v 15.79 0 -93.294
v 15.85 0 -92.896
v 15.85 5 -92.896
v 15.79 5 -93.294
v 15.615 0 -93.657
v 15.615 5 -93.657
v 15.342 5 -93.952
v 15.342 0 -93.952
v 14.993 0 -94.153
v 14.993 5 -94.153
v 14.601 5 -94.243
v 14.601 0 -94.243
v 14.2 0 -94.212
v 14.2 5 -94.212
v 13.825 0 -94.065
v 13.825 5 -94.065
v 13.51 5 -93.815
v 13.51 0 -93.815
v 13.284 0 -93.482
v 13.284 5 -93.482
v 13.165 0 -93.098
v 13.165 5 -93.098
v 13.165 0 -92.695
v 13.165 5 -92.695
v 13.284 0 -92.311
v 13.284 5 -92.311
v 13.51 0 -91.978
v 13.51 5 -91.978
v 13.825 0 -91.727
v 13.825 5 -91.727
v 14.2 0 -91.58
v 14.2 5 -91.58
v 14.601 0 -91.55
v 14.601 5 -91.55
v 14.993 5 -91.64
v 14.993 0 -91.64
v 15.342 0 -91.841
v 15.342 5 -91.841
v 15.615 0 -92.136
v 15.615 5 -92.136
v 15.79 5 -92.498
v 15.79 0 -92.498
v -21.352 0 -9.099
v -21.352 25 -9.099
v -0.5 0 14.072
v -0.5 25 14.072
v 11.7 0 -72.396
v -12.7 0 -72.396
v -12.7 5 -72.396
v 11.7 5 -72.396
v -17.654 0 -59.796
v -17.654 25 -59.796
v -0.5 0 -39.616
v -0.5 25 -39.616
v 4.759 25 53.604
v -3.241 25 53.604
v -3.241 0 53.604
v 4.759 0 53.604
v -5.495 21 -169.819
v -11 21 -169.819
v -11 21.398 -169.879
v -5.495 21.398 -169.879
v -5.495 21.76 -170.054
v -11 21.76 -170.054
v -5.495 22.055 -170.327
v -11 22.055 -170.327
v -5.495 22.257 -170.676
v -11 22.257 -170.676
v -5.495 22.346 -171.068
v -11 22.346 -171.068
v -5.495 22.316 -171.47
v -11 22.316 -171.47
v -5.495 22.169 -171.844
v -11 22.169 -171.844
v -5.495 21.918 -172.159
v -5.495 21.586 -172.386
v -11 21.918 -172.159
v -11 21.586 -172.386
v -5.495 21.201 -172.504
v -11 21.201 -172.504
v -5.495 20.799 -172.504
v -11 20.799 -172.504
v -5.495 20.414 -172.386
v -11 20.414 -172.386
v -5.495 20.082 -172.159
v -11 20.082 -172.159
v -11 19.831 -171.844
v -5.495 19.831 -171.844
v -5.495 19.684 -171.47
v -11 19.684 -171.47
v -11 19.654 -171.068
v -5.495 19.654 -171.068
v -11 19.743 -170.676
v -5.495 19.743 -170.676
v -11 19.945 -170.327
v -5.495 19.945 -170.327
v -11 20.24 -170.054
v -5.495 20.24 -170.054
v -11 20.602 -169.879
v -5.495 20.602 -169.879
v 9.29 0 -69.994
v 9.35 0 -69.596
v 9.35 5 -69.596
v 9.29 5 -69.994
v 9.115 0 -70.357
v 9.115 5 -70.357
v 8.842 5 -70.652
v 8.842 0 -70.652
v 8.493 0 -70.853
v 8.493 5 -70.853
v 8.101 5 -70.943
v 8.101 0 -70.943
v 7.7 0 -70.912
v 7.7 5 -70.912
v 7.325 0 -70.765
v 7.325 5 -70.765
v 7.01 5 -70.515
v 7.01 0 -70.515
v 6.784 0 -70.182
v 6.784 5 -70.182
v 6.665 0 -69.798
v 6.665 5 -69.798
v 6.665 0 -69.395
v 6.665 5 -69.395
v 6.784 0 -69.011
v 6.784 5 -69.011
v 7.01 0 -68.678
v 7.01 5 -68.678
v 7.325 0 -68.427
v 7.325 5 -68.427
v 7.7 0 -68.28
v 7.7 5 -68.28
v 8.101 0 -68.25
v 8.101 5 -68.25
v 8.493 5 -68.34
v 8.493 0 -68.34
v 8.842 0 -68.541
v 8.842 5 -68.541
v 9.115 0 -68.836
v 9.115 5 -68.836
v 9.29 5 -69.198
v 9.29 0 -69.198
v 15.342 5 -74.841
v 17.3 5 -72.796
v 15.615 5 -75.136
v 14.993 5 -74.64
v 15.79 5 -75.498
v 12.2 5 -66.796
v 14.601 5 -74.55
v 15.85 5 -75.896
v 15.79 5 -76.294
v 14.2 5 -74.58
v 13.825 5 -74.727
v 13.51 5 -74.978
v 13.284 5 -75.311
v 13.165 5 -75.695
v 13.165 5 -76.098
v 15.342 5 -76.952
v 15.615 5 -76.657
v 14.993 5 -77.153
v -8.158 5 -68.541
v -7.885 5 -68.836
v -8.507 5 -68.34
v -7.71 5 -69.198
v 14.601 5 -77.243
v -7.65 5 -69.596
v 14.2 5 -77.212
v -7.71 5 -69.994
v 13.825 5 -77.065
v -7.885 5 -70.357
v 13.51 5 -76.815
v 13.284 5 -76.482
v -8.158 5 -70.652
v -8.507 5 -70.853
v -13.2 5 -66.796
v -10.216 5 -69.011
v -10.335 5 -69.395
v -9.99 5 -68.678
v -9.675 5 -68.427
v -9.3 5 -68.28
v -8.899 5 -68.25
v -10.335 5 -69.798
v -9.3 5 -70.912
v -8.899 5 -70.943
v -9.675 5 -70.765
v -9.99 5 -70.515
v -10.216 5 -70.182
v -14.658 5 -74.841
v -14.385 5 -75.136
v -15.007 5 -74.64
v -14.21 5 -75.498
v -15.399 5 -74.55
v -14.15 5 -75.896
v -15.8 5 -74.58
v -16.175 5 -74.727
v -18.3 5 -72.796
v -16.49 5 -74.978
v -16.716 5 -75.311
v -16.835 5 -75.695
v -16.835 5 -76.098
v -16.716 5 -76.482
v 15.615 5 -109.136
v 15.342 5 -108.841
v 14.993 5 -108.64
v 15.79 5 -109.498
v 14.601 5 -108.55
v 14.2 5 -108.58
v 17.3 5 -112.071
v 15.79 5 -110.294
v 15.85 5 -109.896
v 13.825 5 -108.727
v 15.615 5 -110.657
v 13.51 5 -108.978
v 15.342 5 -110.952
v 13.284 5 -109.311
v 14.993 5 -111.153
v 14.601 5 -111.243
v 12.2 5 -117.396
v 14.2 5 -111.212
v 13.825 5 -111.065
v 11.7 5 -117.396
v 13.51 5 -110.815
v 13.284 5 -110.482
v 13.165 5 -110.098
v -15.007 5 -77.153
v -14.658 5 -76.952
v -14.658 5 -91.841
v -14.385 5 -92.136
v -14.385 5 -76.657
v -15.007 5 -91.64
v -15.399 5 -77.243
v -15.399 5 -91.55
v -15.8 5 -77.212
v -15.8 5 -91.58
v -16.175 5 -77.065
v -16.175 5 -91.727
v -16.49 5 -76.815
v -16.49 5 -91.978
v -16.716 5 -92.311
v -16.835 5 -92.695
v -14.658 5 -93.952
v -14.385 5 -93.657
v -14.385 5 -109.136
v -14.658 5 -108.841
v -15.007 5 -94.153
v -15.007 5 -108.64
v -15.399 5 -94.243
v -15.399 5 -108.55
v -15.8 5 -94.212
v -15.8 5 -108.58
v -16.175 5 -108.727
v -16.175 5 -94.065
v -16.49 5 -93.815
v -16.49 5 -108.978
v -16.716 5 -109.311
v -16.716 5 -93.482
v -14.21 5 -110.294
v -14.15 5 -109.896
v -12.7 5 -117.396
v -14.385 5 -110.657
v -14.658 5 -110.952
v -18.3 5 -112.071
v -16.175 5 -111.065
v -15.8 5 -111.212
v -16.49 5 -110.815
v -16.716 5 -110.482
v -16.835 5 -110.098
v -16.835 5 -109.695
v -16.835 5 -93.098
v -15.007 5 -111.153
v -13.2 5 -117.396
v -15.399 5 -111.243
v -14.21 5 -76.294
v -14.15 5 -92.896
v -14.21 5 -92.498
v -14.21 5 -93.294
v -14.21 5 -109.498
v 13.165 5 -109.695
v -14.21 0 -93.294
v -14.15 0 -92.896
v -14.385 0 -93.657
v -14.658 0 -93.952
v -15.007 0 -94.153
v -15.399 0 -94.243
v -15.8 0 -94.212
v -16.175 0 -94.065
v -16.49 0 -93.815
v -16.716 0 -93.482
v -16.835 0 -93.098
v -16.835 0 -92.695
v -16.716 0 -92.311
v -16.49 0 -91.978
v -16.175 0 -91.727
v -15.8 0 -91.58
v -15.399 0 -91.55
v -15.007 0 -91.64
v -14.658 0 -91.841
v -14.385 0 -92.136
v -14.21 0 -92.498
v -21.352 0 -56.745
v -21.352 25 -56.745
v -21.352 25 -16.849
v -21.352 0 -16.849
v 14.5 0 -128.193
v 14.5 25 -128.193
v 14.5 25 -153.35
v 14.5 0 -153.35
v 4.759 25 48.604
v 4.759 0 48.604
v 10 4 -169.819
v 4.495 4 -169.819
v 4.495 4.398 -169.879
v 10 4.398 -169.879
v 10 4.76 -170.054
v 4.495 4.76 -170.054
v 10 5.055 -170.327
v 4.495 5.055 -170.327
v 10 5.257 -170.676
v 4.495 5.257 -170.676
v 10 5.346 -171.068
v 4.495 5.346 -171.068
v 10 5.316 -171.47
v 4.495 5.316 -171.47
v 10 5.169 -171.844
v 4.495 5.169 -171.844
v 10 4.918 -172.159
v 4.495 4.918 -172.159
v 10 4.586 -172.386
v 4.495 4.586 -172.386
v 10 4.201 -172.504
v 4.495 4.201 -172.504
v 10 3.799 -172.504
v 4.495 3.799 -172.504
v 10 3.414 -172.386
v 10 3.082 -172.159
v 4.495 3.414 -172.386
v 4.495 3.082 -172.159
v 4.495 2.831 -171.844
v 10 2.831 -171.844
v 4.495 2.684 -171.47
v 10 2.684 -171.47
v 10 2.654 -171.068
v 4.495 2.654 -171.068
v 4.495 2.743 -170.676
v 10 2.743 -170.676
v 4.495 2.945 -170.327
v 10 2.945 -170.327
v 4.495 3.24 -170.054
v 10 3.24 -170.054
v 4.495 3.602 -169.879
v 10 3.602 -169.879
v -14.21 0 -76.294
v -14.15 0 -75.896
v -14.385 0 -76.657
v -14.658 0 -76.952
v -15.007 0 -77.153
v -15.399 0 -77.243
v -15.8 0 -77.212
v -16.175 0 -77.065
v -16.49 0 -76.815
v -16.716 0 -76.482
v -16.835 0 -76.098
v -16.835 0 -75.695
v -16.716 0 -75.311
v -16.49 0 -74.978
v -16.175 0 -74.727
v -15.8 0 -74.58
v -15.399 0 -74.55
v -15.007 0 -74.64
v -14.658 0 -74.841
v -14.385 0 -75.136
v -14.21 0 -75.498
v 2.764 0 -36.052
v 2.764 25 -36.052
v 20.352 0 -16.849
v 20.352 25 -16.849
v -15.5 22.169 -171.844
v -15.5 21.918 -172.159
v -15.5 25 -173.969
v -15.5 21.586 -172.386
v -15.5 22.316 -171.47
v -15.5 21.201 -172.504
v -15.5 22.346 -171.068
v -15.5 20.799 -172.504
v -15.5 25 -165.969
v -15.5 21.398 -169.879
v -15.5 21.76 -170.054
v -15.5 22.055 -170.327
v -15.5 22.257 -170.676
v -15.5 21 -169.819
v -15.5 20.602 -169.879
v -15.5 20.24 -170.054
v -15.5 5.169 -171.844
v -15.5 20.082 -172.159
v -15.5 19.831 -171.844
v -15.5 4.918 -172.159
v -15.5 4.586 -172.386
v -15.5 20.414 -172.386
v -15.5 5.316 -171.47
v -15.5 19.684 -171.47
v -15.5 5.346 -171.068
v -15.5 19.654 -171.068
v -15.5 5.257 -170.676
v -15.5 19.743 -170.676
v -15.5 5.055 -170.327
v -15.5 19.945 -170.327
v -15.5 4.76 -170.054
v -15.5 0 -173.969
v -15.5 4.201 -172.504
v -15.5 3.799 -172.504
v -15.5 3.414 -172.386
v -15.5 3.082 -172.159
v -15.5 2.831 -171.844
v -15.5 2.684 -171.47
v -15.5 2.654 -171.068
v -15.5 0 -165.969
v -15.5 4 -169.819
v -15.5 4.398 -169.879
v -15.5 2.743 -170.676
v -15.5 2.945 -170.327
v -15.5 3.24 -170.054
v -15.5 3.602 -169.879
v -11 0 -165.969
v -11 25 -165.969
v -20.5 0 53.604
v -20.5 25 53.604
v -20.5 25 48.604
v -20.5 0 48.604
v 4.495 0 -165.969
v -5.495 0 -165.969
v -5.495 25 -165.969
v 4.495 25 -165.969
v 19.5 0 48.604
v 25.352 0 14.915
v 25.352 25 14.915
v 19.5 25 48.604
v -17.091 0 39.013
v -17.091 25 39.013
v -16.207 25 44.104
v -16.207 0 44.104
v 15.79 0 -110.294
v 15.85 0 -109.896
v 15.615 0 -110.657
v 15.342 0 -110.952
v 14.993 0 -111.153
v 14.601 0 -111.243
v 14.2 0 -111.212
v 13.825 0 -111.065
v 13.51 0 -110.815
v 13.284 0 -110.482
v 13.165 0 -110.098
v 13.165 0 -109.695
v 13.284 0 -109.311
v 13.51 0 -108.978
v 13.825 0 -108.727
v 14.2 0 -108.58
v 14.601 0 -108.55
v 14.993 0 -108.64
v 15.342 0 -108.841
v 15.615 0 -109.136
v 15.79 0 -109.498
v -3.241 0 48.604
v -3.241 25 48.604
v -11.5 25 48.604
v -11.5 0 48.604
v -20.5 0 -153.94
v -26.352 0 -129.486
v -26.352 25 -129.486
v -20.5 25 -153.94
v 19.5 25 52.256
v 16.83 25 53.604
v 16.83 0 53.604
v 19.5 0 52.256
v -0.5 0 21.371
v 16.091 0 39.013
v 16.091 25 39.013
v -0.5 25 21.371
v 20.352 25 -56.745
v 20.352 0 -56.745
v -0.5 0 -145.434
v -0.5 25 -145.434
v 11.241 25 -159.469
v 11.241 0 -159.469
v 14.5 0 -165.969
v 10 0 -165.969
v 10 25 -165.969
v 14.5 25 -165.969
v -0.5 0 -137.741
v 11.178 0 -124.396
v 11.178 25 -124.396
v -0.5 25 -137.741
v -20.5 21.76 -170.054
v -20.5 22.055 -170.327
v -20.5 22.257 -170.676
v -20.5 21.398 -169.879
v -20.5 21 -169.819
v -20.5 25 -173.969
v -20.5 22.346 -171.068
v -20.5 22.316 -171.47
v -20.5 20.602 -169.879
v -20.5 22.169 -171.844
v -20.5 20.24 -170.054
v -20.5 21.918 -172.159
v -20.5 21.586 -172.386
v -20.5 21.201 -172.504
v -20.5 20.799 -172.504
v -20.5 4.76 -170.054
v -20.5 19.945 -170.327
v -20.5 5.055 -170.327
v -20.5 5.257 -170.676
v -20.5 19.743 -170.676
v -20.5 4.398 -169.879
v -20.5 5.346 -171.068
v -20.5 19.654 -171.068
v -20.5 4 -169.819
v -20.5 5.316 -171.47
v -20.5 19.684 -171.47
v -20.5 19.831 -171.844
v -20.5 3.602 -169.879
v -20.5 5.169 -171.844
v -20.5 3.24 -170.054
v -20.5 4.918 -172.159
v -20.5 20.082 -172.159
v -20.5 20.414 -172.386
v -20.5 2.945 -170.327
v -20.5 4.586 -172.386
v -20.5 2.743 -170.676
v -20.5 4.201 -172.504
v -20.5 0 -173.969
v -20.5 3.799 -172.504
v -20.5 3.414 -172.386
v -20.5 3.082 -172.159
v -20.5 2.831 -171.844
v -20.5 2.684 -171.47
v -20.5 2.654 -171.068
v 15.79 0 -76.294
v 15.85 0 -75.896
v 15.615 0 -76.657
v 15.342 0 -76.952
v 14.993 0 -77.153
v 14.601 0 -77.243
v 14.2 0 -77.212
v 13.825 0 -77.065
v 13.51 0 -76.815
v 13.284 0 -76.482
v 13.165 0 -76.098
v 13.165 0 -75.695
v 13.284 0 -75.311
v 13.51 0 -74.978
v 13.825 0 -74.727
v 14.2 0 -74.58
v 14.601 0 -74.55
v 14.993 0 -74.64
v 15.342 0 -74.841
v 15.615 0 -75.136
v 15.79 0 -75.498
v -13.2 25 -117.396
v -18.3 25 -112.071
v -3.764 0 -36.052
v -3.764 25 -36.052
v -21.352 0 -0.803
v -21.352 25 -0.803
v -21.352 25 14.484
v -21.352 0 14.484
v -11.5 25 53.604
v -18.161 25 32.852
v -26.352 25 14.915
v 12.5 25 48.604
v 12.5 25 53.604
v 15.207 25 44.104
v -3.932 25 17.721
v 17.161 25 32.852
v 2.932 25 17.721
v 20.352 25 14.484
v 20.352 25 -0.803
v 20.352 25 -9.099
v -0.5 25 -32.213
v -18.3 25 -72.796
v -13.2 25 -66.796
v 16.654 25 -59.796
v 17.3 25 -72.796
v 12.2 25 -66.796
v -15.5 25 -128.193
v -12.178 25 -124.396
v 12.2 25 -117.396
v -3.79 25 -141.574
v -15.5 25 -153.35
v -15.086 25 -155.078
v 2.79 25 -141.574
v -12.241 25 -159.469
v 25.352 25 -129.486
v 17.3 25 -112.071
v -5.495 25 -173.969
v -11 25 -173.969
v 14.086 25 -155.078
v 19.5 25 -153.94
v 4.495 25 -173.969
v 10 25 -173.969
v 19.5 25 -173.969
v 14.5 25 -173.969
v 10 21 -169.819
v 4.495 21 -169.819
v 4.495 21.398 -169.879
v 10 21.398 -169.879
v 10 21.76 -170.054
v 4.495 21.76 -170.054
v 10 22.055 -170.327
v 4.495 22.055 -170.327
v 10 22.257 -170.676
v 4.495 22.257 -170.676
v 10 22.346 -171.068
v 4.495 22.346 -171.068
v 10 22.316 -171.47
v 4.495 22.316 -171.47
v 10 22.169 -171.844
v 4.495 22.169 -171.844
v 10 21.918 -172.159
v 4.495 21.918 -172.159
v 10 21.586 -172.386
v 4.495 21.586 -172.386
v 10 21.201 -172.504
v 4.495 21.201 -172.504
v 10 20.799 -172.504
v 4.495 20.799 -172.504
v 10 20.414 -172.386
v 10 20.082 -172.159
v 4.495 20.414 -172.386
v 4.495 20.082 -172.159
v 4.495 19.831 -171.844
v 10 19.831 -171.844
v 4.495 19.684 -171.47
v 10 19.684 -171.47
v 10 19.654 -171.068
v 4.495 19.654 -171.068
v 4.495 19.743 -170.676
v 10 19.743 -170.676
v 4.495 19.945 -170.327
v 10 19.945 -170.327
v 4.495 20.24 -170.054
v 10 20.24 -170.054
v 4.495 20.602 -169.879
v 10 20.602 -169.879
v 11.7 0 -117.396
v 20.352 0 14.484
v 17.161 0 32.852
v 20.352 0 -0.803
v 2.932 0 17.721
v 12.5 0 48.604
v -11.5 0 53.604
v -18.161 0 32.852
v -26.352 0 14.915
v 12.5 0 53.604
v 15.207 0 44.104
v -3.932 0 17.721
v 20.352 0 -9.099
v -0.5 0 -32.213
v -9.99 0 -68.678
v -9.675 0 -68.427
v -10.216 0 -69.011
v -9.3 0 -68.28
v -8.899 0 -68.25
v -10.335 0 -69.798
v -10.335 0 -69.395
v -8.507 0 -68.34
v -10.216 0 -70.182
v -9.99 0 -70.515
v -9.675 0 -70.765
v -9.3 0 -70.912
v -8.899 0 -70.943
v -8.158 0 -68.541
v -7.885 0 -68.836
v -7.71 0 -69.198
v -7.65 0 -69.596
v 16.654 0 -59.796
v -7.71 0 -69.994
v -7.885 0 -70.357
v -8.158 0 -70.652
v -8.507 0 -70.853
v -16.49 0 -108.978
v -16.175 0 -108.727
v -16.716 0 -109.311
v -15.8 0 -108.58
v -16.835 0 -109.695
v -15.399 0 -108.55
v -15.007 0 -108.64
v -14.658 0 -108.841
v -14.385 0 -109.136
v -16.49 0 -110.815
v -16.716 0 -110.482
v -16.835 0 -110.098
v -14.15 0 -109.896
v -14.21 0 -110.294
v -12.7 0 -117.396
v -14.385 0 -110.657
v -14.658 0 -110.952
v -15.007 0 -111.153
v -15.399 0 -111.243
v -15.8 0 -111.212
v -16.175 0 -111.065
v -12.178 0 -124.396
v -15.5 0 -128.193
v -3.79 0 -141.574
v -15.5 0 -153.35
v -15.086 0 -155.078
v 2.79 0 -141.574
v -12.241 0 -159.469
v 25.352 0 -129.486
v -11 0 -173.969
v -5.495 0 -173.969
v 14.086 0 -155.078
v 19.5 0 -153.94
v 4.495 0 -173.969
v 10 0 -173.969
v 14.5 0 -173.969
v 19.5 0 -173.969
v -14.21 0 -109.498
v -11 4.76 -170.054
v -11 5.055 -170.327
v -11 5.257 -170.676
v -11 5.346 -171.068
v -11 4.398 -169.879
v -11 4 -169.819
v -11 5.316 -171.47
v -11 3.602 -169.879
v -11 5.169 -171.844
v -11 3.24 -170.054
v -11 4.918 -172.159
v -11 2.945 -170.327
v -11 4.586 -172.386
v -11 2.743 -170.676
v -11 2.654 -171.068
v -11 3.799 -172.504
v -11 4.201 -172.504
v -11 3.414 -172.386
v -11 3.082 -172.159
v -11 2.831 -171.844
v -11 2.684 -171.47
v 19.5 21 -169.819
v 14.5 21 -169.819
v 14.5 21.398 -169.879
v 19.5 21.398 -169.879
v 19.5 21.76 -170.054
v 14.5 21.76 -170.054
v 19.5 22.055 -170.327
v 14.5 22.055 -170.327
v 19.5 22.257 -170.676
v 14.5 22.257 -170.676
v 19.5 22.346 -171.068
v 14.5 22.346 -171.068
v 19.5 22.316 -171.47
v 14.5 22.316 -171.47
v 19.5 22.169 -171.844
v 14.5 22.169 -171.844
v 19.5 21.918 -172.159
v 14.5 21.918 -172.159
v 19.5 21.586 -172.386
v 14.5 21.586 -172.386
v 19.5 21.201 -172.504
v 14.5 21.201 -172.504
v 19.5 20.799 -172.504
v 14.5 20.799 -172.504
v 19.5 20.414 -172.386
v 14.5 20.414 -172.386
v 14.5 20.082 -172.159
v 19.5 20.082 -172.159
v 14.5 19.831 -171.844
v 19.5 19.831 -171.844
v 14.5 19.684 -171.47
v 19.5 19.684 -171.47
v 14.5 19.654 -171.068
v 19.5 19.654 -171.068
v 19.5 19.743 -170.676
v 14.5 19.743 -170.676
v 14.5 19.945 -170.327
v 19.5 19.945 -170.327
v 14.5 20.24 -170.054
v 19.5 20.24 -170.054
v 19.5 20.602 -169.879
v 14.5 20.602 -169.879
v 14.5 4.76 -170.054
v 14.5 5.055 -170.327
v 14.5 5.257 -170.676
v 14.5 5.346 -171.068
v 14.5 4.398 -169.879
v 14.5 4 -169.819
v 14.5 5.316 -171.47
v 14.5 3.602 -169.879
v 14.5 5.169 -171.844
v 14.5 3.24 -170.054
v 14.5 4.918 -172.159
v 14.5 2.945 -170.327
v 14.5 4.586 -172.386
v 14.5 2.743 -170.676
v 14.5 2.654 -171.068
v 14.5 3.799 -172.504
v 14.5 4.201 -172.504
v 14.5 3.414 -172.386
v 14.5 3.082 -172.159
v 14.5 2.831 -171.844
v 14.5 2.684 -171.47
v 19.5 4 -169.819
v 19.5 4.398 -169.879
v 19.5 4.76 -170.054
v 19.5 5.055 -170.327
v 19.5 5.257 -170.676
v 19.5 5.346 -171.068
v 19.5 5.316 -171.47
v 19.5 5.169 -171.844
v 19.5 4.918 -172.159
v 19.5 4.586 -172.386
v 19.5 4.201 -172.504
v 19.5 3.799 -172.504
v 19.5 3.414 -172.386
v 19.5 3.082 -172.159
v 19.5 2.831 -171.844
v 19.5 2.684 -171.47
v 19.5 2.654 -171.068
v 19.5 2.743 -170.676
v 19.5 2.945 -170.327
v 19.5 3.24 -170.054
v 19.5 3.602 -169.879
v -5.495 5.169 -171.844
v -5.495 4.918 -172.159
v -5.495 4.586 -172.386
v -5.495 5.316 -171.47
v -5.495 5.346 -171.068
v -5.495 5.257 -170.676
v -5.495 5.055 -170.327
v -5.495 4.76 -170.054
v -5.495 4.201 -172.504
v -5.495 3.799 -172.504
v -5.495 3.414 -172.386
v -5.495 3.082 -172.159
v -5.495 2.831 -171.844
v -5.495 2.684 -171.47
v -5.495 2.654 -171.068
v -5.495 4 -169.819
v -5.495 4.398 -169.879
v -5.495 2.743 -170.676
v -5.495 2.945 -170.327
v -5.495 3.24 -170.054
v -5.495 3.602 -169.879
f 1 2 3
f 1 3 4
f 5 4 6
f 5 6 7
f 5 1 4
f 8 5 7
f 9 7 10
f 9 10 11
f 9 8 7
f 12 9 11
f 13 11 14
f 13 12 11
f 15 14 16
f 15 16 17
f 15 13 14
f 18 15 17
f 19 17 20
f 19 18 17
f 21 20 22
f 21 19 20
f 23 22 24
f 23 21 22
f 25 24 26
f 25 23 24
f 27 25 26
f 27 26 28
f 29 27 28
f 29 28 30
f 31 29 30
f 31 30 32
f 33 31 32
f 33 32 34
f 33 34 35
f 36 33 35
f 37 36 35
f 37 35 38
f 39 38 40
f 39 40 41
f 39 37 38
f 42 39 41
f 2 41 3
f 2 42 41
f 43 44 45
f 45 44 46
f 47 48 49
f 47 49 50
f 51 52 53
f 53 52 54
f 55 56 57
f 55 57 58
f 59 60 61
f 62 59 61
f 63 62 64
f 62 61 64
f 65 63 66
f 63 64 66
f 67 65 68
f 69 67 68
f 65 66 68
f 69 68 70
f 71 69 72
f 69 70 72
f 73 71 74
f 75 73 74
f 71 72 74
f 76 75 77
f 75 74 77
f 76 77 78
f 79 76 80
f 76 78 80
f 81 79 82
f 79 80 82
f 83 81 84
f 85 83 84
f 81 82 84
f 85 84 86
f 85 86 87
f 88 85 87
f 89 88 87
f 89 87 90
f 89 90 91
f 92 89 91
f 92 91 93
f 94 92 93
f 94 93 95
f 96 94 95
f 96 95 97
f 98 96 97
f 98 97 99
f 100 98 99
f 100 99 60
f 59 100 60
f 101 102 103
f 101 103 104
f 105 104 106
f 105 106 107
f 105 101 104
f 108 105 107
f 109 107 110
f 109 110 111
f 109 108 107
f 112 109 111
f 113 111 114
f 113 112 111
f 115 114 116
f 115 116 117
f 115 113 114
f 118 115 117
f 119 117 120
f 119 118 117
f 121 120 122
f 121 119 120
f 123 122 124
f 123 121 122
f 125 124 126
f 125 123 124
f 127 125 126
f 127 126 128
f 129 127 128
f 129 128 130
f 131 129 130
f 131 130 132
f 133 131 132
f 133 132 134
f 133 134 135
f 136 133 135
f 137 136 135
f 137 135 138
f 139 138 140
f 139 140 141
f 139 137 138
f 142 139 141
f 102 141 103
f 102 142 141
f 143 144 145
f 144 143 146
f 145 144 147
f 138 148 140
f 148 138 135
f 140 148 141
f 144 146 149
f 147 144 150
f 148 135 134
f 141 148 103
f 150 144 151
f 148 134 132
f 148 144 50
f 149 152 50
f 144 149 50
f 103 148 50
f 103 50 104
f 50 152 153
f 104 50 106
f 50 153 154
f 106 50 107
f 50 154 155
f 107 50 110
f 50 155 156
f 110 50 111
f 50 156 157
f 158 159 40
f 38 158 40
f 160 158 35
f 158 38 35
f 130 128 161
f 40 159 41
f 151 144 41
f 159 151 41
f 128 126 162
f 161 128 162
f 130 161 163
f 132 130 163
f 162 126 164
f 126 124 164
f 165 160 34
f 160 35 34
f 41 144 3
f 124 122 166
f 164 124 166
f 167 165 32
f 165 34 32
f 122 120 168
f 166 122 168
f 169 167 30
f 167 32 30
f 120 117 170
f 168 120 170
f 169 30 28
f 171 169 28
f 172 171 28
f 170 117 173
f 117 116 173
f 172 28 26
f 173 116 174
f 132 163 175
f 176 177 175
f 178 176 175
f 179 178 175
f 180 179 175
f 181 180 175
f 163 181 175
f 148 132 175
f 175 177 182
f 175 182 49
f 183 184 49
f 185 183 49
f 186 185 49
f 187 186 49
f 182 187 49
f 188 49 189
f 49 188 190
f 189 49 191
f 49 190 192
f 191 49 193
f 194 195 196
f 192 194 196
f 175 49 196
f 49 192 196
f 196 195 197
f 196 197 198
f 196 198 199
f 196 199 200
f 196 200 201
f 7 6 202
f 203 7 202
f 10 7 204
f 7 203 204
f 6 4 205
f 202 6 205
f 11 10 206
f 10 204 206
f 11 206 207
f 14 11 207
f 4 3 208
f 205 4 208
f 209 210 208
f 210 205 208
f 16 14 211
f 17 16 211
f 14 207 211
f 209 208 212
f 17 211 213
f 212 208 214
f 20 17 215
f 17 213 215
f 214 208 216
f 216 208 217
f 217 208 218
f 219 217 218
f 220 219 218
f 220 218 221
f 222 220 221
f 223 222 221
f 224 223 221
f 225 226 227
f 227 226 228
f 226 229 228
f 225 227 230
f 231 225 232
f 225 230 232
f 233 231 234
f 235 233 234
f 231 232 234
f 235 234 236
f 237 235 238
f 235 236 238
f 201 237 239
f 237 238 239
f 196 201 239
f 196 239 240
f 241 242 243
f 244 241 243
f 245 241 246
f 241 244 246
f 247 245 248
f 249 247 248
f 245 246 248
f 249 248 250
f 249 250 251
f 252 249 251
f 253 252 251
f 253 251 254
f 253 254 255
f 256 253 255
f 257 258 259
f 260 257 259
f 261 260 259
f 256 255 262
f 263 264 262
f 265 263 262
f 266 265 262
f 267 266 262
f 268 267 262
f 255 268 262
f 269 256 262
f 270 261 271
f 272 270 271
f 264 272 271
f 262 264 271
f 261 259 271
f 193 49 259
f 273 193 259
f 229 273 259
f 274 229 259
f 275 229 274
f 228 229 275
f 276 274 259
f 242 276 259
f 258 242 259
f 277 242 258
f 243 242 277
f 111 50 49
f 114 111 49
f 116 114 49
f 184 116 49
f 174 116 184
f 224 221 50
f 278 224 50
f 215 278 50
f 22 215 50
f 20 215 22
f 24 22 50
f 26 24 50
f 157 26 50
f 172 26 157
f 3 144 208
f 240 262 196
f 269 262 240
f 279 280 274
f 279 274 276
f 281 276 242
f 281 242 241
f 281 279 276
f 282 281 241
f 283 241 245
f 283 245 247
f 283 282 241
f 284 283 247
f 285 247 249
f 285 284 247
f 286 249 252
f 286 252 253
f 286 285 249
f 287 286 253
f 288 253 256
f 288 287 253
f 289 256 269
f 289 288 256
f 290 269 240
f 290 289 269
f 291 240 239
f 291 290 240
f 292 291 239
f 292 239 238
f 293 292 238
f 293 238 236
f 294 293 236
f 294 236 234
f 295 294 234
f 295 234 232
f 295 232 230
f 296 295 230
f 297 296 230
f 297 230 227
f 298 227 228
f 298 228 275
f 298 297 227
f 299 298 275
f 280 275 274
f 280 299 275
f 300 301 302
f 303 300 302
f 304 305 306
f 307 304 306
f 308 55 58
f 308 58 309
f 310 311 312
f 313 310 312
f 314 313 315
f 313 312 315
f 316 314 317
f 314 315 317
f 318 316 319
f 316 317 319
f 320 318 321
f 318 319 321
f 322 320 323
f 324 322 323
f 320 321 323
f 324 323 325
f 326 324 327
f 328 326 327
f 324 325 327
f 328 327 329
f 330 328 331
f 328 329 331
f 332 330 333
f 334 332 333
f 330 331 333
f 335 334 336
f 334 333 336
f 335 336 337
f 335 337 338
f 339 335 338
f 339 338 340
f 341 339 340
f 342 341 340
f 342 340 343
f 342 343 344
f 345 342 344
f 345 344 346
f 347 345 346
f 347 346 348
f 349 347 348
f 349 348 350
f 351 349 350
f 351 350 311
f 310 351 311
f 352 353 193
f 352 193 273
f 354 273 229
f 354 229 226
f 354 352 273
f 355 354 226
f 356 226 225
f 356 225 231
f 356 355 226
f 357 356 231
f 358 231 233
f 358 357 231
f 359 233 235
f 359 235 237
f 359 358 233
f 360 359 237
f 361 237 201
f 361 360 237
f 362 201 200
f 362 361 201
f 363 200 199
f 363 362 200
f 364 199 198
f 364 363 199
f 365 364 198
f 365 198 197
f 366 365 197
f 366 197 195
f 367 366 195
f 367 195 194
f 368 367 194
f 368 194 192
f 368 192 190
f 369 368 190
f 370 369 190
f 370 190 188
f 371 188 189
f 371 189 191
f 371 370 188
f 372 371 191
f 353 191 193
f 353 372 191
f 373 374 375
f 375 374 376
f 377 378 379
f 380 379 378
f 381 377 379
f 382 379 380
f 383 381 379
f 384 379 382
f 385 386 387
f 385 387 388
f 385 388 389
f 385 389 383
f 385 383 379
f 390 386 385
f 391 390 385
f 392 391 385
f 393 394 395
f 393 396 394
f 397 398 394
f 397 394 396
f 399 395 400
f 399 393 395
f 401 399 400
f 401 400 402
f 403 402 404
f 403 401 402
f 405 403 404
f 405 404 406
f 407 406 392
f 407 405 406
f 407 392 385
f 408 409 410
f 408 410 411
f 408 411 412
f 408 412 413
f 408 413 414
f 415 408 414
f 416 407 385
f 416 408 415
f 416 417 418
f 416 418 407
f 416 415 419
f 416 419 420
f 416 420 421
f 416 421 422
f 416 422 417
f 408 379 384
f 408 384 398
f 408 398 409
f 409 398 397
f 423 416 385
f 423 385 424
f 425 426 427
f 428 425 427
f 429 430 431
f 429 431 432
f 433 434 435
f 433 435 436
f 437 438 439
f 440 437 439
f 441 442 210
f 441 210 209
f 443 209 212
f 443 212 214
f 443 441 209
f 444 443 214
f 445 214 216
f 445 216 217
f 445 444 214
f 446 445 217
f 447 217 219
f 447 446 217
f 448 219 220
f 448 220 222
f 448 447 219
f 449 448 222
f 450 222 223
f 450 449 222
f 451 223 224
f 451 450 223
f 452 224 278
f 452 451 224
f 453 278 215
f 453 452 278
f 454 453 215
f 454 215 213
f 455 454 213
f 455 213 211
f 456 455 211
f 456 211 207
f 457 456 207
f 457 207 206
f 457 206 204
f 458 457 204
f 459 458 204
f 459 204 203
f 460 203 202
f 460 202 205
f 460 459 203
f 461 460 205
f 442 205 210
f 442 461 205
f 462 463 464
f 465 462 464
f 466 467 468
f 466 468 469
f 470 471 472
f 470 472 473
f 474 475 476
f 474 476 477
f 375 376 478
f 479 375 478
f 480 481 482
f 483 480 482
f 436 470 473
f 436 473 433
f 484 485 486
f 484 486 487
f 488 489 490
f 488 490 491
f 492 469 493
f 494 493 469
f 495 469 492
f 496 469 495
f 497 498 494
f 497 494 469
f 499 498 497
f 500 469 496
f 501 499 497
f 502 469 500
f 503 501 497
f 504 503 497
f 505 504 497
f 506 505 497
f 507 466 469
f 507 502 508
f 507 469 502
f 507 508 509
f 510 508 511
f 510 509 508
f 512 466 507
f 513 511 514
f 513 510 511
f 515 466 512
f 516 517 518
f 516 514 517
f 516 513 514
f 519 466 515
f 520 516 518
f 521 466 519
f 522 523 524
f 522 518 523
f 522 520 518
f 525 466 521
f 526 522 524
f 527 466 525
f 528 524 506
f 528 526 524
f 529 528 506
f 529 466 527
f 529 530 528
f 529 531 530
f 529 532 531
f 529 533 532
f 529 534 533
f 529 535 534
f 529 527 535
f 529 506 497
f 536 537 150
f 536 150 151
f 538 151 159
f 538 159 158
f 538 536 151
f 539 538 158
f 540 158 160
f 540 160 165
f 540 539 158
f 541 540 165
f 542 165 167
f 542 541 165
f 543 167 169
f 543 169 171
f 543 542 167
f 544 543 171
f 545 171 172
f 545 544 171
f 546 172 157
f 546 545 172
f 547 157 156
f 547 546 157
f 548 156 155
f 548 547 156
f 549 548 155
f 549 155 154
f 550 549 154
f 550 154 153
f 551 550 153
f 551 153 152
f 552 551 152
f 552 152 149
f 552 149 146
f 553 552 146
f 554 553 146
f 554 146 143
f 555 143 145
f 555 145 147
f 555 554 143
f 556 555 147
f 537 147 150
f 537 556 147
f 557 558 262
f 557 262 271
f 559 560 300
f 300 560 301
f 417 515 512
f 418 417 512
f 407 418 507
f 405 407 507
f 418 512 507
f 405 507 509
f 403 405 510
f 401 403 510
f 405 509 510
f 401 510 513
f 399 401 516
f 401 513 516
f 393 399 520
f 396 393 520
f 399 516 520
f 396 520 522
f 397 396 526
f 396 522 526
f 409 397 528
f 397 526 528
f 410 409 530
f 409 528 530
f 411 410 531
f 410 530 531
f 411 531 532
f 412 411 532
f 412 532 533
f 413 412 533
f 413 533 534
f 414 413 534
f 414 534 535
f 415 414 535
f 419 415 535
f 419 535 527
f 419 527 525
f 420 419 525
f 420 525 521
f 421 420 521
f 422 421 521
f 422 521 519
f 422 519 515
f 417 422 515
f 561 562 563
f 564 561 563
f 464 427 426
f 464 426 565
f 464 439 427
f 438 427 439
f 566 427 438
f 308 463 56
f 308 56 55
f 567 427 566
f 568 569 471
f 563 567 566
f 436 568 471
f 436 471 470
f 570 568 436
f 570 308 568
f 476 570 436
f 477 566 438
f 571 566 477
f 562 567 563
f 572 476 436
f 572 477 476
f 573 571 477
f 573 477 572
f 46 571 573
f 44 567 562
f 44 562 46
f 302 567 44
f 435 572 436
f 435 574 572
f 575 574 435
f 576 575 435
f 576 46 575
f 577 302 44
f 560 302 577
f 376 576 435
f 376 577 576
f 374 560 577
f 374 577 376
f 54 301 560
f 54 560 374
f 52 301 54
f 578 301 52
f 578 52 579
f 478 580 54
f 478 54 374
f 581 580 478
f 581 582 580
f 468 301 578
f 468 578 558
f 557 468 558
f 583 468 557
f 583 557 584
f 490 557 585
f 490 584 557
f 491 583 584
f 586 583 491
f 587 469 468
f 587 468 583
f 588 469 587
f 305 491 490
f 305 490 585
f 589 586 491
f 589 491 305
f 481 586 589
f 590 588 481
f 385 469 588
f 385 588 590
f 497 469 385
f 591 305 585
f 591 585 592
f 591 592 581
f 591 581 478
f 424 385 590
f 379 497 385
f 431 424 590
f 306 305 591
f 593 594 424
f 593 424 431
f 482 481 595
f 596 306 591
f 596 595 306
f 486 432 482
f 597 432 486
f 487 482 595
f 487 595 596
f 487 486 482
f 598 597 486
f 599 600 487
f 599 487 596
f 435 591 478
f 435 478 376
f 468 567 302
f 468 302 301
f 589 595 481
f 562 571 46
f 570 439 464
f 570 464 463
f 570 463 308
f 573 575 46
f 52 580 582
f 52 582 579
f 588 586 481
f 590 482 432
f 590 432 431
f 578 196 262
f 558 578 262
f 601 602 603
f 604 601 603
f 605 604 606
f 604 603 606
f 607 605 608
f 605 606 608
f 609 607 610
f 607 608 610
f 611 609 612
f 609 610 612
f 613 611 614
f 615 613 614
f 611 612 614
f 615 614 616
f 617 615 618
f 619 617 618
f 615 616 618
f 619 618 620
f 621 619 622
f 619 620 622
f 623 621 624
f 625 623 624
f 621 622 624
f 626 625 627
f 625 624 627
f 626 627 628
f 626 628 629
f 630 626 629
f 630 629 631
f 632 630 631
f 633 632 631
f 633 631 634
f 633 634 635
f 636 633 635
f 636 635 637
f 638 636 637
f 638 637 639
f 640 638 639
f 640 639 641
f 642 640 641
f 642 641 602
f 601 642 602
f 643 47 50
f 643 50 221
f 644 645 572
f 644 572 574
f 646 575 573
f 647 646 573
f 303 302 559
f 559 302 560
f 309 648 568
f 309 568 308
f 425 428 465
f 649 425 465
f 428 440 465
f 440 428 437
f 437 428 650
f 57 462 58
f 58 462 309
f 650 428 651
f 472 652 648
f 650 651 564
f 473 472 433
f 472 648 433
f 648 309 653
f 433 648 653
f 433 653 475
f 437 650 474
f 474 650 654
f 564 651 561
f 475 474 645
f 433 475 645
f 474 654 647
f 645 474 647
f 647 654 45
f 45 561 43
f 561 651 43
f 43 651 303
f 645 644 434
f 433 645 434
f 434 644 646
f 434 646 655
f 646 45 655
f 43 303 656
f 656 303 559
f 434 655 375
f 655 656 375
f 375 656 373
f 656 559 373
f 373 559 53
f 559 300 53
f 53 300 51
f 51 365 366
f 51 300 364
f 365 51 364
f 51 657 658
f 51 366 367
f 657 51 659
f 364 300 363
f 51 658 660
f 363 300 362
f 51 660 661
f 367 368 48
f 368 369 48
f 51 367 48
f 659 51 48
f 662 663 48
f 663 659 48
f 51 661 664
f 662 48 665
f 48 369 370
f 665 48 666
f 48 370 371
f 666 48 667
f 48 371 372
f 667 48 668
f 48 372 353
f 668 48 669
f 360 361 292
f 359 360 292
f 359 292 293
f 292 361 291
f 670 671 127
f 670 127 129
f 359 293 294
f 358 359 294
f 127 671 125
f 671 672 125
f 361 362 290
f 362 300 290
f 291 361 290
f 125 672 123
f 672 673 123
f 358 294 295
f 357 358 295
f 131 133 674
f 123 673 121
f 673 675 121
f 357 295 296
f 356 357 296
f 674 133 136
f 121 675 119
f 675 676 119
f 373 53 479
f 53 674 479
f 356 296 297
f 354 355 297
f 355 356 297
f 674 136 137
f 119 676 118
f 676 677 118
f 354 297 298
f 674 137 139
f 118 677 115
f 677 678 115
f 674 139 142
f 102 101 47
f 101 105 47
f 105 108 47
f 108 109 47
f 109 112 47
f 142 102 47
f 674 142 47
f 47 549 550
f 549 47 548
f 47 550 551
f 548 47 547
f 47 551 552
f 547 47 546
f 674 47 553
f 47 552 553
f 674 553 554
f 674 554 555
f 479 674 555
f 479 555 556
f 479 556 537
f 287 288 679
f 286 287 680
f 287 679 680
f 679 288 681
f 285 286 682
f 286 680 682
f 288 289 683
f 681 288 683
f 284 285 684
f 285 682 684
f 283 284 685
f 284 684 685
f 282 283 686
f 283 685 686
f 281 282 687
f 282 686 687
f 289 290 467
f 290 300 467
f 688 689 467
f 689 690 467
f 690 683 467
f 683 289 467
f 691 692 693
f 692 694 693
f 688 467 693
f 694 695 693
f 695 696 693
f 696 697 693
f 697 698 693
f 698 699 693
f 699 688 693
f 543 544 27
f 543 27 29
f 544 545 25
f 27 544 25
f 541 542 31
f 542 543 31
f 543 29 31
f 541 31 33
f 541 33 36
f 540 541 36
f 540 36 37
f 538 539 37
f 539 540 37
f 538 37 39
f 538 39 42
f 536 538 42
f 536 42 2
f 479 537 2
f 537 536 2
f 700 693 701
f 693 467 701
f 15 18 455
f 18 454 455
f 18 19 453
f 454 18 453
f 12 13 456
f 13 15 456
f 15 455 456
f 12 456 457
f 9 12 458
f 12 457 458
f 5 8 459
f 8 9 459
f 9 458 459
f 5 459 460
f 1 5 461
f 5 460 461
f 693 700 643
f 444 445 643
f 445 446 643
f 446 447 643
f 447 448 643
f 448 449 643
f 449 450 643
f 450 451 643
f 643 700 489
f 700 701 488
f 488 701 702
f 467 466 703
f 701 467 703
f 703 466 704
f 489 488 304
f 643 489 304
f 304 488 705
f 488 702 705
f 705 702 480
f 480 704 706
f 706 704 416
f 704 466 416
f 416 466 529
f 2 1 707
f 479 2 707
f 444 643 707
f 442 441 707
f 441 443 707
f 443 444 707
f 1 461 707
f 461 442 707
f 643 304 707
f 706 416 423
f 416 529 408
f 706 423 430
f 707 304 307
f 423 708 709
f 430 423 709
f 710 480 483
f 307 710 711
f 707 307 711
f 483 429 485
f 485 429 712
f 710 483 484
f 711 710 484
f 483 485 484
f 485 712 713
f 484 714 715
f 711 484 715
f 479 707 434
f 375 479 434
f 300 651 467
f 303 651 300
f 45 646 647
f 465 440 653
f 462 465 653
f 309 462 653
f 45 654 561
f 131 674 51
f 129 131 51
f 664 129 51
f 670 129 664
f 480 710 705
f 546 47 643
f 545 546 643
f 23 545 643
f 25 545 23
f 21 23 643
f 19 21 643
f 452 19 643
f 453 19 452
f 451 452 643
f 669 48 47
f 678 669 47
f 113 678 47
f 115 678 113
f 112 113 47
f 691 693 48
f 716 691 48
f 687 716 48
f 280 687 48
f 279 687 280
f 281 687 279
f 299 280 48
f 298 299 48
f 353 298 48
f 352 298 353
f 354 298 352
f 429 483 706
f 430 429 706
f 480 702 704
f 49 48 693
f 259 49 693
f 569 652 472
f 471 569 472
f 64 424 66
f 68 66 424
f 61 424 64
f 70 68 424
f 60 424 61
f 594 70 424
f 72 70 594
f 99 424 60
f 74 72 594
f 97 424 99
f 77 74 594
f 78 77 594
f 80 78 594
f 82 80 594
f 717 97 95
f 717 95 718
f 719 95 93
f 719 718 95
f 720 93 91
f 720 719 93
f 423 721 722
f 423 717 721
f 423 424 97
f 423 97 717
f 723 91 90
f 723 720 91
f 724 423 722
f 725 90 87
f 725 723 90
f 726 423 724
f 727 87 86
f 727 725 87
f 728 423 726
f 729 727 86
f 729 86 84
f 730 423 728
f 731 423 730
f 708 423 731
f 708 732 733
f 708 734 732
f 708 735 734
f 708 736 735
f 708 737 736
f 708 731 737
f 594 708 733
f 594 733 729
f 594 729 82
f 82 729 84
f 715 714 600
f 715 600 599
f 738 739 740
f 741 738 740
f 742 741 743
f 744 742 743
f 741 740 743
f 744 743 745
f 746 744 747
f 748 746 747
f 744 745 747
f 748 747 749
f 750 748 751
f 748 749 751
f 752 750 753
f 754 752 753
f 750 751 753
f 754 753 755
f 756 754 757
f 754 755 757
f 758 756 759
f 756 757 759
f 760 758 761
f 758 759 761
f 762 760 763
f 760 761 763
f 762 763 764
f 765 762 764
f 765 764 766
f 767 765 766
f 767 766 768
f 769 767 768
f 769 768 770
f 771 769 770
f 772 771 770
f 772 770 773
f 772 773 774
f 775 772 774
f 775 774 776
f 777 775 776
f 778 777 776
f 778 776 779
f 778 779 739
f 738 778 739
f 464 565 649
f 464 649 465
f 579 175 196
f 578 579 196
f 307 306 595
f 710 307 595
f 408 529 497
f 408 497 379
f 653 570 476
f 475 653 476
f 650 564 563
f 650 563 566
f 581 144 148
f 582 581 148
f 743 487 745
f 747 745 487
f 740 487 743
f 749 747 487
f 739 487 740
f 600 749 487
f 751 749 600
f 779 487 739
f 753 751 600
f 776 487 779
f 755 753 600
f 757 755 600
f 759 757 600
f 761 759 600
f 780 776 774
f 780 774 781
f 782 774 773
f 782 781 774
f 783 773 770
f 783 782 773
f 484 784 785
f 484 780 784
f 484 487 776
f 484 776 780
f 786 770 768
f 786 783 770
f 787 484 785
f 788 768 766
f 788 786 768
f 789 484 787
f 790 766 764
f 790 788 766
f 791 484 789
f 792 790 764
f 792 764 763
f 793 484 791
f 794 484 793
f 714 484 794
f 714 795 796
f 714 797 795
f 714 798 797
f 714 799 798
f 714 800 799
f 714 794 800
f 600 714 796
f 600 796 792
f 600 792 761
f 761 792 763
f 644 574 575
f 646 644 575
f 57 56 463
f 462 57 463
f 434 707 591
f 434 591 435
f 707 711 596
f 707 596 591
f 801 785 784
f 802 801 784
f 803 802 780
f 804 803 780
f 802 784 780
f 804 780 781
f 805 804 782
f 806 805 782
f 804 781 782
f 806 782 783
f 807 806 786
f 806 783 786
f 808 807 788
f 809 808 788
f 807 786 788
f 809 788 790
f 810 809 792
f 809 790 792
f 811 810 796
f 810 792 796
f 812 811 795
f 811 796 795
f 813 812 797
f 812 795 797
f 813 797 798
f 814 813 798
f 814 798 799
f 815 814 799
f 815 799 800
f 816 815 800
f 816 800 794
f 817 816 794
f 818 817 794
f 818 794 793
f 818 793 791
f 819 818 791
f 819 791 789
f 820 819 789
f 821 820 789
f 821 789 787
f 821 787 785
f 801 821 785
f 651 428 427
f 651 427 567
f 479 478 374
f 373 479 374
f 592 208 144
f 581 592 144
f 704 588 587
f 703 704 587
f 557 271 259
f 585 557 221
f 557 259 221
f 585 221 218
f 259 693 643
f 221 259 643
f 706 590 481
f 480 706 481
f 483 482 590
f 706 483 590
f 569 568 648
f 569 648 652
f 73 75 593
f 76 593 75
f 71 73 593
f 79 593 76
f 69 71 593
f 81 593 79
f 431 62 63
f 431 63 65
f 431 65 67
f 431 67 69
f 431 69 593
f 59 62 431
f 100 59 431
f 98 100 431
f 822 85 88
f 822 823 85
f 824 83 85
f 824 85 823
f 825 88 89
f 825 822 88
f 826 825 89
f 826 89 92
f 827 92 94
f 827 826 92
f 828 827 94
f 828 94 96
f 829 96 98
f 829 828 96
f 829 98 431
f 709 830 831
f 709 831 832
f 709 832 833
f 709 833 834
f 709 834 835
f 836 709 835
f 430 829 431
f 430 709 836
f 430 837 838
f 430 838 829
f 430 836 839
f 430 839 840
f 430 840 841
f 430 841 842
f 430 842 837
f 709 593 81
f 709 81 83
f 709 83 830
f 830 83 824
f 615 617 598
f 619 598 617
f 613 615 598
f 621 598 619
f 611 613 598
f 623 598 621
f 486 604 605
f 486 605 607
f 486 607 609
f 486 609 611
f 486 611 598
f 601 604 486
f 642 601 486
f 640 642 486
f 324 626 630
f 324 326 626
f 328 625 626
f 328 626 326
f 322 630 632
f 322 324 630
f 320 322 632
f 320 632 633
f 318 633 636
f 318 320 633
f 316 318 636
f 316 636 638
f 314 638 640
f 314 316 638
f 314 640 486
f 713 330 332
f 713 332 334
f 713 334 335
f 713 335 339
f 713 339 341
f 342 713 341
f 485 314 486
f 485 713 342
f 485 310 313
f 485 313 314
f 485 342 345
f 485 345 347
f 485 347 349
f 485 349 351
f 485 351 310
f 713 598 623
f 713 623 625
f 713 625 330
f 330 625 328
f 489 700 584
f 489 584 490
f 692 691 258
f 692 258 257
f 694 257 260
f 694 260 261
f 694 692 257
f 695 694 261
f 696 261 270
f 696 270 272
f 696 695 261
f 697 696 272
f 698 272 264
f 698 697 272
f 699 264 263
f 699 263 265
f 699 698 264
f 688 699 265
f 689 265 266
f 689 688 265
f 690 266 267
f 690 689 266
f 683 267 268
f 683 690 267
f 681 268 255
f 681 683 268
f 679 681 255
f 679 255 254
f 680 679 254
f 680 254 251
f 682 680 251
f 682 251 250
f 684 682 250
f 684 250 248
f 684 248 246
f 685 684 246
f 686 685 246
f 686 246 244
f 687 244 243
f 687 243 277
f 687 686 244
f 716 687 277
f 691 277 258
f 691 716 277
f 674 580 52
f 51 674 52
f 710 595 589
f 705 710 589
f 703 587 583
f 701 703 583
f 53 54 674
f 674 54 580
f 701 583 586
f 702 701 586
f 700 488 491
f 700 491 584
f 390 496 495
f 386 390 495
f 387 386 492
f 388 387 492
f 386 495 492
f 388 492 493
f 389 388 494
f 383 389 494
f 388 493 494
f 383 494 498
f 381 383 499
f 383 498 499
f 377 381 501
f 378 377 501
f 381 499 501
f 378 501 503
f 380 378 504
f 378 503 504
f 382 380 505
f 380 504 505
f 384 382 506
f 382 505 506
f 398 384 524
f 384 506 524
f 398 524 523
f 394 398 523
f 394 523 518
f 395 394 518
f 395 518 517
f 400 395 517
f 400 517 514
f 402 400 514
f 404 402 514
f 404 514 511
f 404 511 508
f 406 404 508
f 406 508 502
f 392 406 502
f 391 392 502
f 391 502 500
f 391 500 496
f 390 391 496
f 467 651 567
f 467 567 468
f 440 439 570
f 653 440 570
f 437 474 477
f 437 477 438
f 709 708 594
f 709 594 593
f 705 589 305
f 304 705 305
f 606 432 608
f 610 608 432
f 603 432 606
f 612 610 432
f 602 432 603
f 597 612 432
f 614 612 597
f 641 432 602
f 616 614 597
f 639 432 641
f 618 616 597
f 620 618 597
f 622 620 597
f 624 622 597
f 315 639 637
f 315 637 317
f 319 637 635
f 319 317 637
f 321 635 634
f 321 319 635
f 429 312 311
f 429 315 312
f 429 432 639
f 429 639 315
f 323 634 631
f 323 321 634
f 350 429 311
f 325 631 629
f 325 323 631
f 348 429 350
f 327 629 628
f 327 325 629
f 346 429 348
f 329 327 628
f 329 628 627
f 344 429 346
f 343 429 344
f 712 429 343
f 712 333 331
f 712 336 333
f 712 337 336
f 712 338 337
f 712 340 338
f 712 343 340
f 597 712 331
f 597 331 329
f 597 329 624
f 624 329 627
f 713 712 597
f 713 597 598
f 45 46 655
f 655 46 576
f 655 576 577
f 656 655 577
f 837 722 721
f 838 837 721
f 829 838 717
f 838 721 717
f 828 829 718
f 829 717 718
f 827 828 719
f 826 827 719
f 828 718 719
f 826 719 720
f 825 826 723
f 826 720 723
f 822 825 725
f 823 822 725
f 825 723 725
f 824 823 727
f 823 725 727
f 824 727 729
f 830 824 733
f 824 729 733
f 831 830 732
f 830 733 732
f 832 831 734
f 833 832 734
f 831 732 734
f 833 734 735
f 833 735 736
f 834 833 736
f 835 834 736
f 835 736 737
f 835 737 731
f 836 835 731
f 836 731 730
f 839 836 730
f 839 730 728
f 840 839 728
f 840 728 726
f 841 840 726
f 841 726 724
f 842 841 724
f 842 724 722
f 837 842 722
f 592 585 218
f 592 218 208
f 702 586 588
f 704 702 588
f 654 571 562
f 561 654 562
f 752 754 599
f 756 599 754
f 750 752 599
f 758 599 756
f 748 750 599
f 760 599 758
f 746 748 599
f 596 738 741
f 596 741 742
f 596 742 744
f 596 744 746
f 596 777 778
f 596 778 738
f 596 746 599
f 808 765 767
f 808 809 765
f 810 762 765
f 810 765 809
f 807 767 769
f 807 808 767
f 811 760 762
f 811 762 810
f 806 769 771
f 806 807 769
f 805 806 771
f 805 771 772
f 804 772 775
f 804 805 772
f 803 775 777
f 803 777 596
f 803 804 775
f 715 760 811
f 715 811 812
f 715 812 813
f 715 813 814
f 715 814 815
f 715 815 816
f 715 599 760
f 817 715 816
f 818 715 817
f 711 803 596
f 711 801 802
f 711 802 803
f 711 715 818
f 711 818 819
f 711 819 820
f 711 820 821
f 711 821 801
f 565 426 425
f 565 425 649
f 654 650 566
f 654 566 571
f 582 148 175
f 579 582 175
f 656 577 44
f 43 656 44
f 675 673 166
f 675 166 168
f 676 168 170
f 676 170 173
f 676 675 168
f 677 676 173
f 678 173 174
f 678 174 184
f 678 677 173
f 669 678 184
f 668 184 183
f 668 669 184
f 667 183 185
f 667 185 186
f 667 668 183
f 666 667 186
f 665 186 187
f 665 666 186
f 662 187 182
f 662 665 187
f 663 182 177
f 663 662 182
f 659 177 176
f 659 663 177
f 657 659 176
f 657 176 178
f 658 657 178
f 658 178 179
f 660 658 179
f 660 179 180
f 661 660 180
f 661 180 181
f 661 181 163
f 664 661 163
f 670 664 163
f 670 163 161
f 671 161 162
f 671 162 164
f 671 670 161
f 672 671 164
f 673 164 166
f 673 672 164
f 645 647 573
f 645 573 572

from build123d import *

# Parameters (mm, degrees)
SZKIC1_W                    = 24.4
SZKIC1_H                    = 45
SZKIC1_R                    = 1.35
DODANIE_WYCI_GNI_CIE1_DEPTH = 5
DODANIE_WYCI_GNI_CIE2_DEPTH = 25
WYTNIJ_WYCI_GNI_CIE5_DEPTH  = 178.720894332
SZKIC7_R                    = 1.35
WYTNIJ_WYCI_GNI_CIE6_DEPTH  = 182.638920752
SZKIC8_W                    = 8
SZKIC8_H                    = 5
SZKIC8_W_2                  = 9
DODANIE_WYCI_GNI_CIE3_DEPTH = 25


with BuildPart() as part:
    # Szkic1 → Dodanie-wyci_gni_cie1 (new body)
    with BuildSketch(Plane(origin=(0, 0, 0), x_dir=(1, 0, 0), z_dir=(0, 1, 0))):
        Polygon((14.5, 165.969204133), (10, 165.969204133), (10, 173.969204133), (4.495079248, 173.969204133), (4.495079248, 165.969204133), (-5.495079248, 165.969204133), (-5.495079248, 173.969204133), (-11, 173.969204133), (-11, 165.969204133), (-15.5, 165.969204133), (-15.5, 173.969204133), (-20.5, 173.969204133), (-20.5, 153.940017653), (-26.352083325, 129.486424712), (-26.352083325, -14.915125095), (-20.5, -48.6036745), (19.5, -48.6036745), (25.352083325, -14.915125095), (25.352083325, 129.486424712), (19.5, 153.940017653), (19.5, 173.969204133), (14.5, 173.969204133), align=None)
        with Locations((-0.5, 94.8963255)):
            Rectangle(SZKIC1_W, SZKIC1_H, mode=Mode.SUBTRACT)
        with Locations((14.5, 109.8963255)):
            Circle(SZKIC1_R, mode=Mode.SUBTRACT)
        with Locations((-15.5, 75.8963255)):
            Circle(SZKIC1_R, mode=Mode.SUBTRACT)
        with Locations((-15.5, 92.8963255)):
            Circle(SZKIC1_R, mode=Mode.SUBTRACT)
        with Locations((-15.5, 109.8963255)):
            Circle(SZKIC1_R, mode=Mode.SUBTRACT)
        with Locations((-9, 69.5963255)):
            Circle(SZKIC1_R, mode=Mode.SUBTRACT)
        with Locations((8, 69.5963255)):
            Circle(SZKIC1_R, mode=Mode.SUBTRACT)
        with Locations((14.5, 75.8963255)):
            Circle(SZKIC1_R, mode=Mode.SUBTRACT)
        with Locations((14.5, 92.8963255)):
            Circle(SZKIC1_R, mode=Mode.SUBTRACT)
    extrude(amount=DODANIE_WYCI_GNI_CIE1_DEPTH)

    # Szkic1_3 → Dodanie-wyci_gni_cie2 (add)
    with BuildSketch(Plane(origin=(0, 0, 0), x_dir=(1, 0, 0), z_dir=(0, 1, 0))):
        Polygon((14.5, 165.969204133), (10, 165.969204133), (10, 173.969204133), (4.495079248, 173.969204133), (4.495079248, 165.969204133), (-5.495079248, 165.969204133), (-5.495079248, 173.969204133), (-11, 173.969204133), (-11, 165.969204133), (-15.5, 165.969204133), (-15.5, 173.969204133), (-20.5, 173.969204133), (-20.5, 153.940017653), (-26.352083325, 129.486424712), (-26.352083325, -14.915125095), (-20.5, -48.6036745), (19.5, -48.6036745), (25.352083325, -14.915125095), (25.352083325, 129.486424712), (19.5, 153.940017653), (19.5, 173.969204133), (14.5, 173.969204133), align=None)
        Polygon((-13.2, 117.3963255), (-12.7, 117.3963255), (11.7, 117.3963255), (12.2, 117.3963255), (17.3, 112.070622628), (17.3, 72.7963255), (12.2, 66.7963255), (-13.2, 66.7963255), (-18.3, 72.7963255), (-18.3, 112.070622628), align=None, mode=Mode.SUBTRACT)
    extrude(amount=DODANIE_WYCI_GNI_CIE2_DEPTH)

    # Szkic6 → Wytnij-wyci_gni_cie5 (cut, through all)
    with BuildSketch(Plane(origin=(0, 25, 0), x_dir=(1, 0, 0), z_dir=(0, 1, 0))):
        Polygon((16.653559582, 59.7963255), (-17.653559582, 59.7963255), (-0.5, 39.615667168), align=None)
        Polygon((-21.352083325, 56.74466496), (-21.352083325, 16.848702414), (-3.763614868, 36.052349129), align=None)
        Polygon((2.763614868, 36.052349129), (20.352083325, 16.848702414), (20.352083325, 56.74466496), align=None)
        Polygon((17.161306881, -32.852341508), (20.352083325, -14.484074364), (20.352083325, 0.802588639), (2.931825406, -17.721341562), align=None)
        Polygon((15.206822662, -44.1036745), (16.091150305, -39.01288651), (-0.5, -21.370592599), (-17.091150305, -39.01288651), (-16.206822662, -44.1036745), align=None)
        Polygon((-0.5, -14.072090524), (20.352083325, 9.098992114), (-0.5, 32.212802226), (-21.352083325, 9.098992114), align=None)
        Polygon((-3.931825406, -17.721341562), (-21.352083325, 0.802588639), (-21.352083325, -14.484074364), (-18.161306881, -32.852341508), align=None)
        Polygon((-12.240631704, 159.469204133), (-0.5, 145.434029611), (11.240631704, 159.469204133), align=None)
        Polygon((-15.086387227, 155.078390111), (-15.5, 153.350062298), (-15.5, 128.192615569), (-3.790002176, 141.574284058), align=None)
        Polygon((-12.177951744, 124.3963255), (11.177951744, 124.3963255), (-0.5, 137.741373143), align=None)
        Polygon((14.5, 128.192615569), (14.5, 153.350062298), (14.086387227, 155.078390111), (2.790002176, 141.574284058), align=None)
    extrude(amount=-WYTNIJ_WYCI_GNI_CIE5_DEPTH, mode=Mode.SUBTRACT)

    # Szkic7 → Wytnij-wyci_gni_cie6 (cut, through all)
    with BuildSketch(Plane.ZY.offset(20.5)):
        with Locations((-171.169204133, 21)):
            Circle(SZKIC7_R)
        with Locations((-171.169204133, 4)):
            Circle(SZKIC7_R)
    extrude(amount=-WYTNIJ_WYCI_GNI_CIE6_DEPTH, mode=Mode.SUBTRACT)

    # Szkic8 → Dodanie-wyci_gni_cie3 (add)
    with BuildSketch(Plane(origin=(0, 25, 0), x_dir=(1, 0, 0), z_dir=(0, 1, 0))):
        Polygon((19.5, -52.255545309), (19.5, -48.6036745), (12.5, -48.6036745), (12.5, -53.6036745), (16.83, -53.6036745), align=None)
        with Locations((0.758846465, -51.1036745)):
            Rectangle(SZKIC8_W, SZKIC8_H)
        with Locations((-16, -51.1036745)):
            Rectangle(SZKIC8_W_2, SZKIC8_H)
    extrude(amount=-DODANIE_WYCI_GNI_CIE3_DEPTH)


solid = part.part
